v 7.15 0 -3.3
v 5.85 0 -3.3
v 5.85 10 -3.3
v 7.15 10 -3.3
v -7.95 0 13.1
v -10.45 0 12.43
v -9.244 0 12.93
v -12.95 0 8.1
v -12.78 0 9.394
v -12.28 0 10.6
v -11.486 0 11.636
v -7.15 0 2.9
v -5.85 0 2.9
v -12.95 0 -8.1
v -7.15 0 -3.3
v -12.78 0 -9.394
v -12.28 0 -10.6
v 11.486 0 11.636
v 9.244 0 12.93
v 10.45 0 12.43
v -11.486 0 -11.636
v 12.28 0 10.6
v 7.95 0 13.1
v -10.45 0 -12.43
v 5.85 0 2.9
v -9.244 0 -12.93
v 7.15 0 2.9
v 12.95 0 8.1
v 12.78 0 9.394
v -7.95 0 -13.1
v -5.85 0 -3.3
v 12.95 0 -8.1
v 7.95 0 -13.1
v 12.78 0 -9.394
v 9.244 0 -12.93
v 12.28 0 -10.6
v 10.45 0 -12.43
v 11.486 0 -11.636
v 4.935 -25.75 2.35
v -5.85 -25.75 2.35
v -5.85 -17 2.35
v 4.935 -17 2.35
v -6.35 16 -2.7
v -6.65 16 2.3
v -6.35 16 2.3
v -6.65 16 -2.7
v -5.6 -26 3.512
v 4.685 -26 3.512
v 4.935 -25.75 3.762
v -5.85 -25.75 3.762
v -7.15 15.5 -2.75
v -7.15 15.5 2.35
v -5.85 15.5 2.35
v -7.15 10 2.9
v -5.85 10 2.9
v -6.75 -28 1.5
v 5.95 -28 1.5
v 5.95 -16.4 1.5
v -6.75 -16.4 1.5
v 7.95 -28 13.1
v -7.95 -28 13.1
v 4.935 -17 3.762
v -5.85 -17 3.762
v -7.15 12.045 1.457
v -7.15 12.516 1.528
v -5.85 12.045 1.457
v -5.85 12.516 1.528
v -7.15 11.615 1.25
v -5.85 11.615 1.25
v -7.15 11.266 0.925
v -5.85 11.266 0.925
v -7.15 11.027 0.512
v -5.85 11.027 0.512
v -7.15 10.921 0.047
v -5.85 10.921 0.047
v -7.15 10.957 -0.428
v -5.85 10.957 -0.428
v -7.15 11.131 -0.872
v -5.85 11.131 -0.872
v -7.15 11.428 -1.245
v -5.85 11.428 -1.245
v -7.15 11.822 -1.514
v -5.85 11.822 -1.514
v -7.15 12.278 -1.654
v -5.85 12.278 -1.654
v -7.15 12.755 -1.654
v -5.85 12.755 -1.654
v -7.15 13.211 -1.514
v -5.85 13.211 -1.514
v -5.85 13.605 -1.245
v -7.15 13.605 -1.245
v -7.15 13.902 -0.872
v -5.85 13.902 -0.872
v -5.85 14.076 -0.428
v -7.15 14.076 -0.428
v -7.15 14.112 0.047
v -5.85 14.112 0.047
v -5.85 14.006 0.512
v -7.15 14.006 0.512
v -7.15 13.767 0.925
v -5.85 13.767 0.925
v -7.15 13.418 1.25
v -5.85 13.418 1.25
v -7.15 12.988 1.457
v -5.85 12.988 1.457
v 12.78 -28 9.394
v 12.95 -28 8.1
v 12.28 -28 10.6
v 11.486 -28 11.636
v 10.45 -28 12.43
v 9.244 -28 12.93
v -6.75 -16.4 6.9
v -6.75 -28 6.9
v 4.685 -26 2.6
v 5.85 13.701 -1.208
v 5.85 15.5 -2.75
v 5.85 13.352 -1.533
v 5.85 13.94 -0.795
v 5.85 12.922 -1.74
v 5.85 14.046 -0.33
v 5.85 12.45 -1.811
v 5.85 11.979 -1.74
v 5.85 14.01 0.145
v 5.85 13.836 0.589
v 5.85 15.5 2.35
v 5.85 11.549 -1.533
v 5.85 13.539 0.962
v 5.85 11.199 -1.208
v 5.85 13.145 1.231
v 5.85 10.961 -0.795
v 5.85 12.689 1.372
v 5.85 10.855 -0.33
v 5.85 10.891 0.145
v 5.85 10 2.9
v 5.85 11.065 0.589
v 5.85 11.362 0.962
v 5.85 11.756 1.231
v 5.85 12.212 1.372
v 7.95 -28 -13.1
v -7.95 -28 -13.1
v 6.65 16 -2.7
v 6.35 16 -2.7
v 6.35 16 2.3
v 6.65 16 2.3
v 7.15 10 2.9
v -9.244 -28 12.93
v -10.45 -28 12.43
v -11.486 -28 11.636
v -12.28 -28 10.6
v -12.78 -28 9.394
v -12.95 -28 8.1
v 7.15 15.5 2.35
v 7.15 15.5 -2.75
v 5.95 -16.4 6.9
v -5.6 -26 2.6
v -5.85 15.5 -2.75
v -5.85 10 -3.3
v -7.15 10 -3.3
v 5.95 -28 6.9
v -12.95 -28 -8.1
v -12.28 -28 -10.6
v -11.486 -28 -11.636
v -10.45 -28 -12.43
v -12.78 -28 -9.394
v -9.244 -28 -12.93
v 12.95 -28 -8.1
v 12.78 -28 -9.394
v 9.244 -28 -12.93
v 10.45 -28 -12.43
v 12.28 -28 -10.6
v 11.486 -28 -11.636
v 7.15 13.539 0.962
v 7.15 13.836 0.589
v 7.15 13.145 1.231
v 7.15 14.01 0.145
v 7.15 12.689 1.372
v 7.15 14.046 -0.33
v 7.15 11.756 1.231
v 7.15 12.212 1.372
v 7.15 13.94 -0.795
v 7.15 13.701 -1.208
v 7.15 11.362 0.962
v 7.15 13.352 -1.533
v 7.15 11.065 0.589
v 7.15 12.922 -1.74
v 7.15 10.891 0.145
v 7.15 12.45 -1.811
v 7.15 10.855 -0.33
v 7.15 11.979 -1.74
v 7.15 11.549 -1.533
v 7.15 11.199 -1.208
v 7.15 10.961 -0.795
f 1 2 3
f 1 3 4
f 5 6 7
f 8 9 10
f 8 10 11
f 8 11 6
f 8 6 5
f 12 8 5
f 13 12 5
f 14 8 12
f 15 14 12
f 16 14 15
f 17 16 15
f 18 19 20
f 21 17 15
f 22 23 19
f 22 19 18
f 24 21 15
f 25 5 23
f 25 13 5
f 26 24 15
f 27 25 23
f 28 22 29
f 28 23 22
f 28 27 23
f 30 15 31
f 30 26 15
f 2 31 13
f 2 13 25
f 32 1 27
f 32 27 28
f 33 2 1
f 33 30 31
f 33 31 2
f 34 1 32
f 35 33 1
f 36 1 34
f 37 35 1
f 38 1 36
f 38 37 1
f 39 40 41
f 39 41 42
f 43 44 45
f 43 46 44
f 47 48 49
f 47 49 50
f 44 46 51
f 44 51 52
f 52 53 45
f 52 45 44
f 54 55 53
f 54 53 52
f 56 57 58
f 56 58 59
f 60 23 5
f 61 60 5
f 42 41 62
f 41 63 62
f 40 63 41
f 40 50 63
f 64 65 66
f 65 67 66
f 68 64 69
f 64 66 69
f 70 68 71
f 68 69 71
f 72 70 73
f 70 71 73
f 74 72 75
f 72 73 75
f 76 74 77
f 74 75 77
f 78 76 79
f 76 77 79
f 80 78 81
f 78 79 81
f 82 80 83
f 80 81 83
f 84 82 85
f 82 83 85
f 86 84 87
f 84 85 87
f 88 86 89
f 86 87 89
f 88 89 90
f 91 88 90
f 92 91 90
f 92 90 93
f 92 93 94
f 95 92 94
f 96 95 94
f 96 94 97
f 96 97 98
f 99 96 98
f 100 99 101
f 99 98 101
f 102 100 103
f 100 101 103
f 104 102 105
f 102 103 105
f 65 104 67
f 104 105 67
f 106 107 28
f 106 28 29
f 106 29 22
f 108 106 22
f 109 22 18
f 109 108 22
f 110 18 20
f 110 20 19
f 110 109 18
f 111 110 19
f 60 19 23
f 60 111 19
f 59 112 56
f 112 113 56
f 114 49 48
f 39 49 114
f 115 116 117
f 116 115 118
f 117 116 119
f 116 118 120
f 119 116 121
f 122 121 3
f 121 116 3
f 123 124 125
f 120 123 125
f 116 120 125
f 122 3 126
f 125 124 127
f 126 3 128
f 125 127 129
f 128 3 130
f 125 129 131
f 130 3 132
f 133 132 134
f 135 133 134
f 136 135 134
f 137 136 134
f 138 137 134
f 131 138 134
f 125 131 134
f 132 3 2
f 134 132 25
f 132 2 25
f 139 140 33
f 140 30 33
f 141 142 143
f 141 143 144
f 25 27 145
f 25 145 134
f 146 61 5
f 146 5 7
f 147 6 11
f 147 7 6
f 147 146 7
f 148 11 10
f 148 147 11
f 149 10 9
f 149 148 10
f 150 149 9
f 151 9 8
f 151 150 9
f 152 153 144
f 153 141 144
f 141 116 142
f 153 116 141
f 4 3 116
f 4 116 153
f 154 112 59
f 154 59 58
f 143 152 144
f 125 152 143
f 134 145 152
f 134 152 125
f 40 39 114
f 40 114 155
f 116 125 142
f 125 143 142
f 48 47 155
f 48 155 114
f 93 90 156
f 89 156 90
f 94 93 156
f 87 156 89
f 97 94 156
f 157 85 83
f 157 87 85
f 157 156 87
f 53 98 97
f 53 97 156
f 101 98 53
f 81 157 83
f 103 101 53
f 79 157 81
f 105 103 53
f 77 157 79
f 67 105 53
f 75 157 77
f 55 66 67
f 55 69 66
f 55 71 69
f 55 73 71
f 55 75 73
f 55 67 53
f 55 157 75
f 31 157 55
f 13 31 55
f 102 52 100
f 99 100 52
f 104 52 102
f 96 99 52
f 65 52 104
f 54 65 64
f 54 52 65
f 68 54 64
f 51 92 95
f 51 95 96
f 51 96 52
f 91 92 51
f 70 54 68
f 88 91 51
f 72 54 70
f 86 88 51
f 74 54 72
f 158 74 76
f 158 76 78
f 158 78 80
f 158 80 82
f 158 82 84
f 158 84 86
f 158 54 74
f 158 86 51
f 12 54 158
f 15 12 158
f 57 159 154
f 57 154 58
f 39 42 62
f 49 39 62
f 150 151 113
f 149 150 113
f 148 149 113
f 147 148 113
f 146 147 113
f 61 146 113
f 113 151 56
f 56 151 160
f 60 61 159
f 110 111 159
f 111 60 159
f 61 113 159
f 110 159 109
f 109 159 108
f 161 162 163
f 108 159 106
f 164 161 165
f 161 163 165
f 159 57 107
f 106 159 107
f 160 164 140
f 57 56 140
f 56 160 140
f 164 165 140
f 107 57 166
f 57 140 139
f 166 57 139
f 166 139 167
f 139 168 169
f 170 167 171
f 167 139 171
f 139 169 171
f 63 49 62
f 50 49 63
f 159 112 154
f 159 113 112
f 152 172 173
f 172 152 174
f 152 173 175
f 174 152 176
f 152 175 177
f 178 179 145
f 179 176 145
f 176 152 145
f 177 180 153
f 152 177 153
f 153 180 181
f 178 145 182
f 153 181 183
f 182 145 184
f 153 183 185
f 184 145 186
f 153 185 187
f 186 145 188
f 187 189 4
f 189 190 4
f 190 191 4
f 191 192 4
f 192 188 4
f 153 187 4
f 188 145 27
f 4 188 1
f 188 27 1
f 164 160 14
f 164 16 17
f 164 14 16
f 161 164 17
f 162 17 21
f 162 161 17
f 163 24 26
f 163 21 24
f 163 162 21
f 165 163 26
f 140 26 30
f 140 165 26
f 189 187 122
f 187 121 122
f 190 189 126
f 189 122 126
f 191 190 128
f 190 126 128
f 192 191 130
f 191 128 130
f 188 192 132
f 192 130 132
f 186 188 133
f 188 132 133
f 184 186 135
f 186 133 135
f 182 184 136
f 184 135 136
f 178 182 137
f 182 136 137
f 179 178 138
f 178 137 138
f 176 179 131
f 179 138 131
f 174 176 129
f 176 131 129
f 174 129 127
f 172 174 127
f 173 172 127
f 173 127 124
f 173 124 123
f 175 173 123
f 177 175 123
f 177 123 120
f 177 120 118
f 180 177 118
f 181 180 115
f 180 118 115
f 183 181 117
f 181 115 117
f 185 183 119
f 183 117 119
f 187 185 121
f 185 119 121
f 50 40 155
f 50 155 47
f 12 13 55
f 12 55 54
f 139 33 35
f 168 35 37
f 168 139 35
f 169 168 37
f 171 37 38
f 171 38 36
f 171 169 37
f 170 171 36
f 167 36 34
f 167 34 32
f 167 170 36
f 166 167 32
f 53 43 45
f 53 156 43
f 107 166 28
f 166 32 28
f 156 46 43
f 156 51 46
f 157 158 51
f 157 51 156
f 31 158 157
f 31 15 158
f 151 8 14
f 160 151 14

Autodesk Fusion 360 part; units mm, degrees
sketch "スケッチ1" plane through (0, 0, 0) normal (0, 1, 0) x (1, 0, 0)
  line L0 (-12.95, 13.1) -> (12.95, 13.1)
  line L1 (12.95, 13.1) -> (12.95, -13.1)
  line L2 (12.95, -13.1) -> (-12.95, -13.1)
  line L3 (-12.95, -13.1) -> (-12.95, 13.1)
  line L4 (5.85, 3.3) -> (5.85, -2.9)
  line L5 (5.85, -2.9) -> (5.85, 3.3)
  line L6 (7.15, -2.9) -> (7.15, 3.3)
  line L7 (5.85, 3.3) -> (7.15, 3.3)
  line L8 (7.15, -2.9) -> (5.85, -2.9)
  line L9 (-7.15, 3.3) -> (-5.85, 3.3)
  line L10 (-5.85, 3.3) -> (-5.85, -2.9)
  line L11 (-5.85, -2.9) -> (-7.15, -2.9)
  line L12 (-7.15, -2.9) -> (-7.15, 3.3)
  line L13 (-12.95, 13.1) -> (12.95, -13.1) construction
  dimension "d1" = 26.2
  dimension "d3" = 1.3
  dimension "d4" = 1.3
  dimension "d5" = 6.2
  dimension "d6" = 6.2
  dimension "d9" = 25.9
  dimension "d10" = 5.8
  dimension "d11" = 5.8
  dimension "d12" = 9.8
  dimension "d13" = 9.8
extrude "押し出し1" add sketch "スケッチ1" against normal blind 28 contours L0 L1 L2 L3 | L4 L5 L6 L7 L8 | L9 L10 L11 L12 makes body 1
extrude "押し出し2" add sketch "スケッチ1" along normal blind 16 contours L4 L5 L6 L7 L8 | L9 L10 L11 L12 bodies 1
fillet "フィレット1" radius 5 4 edges at (12.95, -14, 13.1) (-12.95, -14, 13.1) (12.95, -14, -13.1) (-12.95, -14, -13.1) on bodies 1
chamfer "面取り1" distance 0.6 distance2 6 4 edges at (-6.5, 16, -3.3) (-6.5, 16, 2.9) (6.5, 16, 2.9) (6.5, 16, -3.3) measured on face at (-6.7167, 16, -1.2333) measured on face at (-6.7167, 16, -1.2333) measured on face at (6.2833, 16, -1.2333) measured on face at (6.2833, 16, -1.2333) on bodies 1
chamfer "面取り2" distance 0.5 angle 45 4 edges at (-7.15, 16, -0.2) (-5.85, 16, -0.2) (5.85, 16, -0.2) (7.15, 16, -0.2) on bodies 1
hole "穴1" at (7.15, 12.4504, -0.2106) direction (-1, 0, 0) diameter 3.2 depth 6 tip angle 118 bodies 1
hole "穴2" at (-7.15, 12.5165, -0.0723) direction (1, 0, 0) diameter 3.2 depth 6 tip angle 118 bodies 1
sketch "スケッチ2" plane through (0, -28, 0) normal (0, -1, 0) x (1, 0, 0)
  arc A0 (-12.95, -8.1) -> (-7.95, -13.1) centre (-7.95, -8.1) ccw
  line L0 (-7.95, -13.1) -> (7.95, -13.1)
  arc A1 (7.95, -13.1) -> (12.95, -8.1) centre (7.95, -8.1) ccw
  line L1 (12.95, -8.1) -> (12.95, 8.1)
  arc A2 (12.95, 8.1) -> (7.95, 13.1) centre (7.95, 8.1) ccw
  line L2 (7.95, 13.1) -> (-7.95, 13.1)
  arc A3 (-7.95, 13.1) -> (-12.95, 8.1) centre (-7.95, 8.1) ccw
  line L3 (-12.95, 8.1) -> (-12.95, -8.1)
  line L4 (-6.75, 6.9) -> (5.95, 6.9)
  line L5 (5.95, 6.9) -> (5.95, 1.5)
  line L6 (5.95, 1.5) -> (-6.75, 1.5)
  line L7 (-6.75, 6.9) -> (-6.75, 1.5)
  line L8 (-5.85, 3.7624) -> (-5.85, 2.35)
  line L9 (-5.85, 2.35) -> (4.9348, 2.35)
  line L10 (4.9348, 2.35) -> (4.9348, 3.7624)
  line L11 (4.9348, 3.7624) -> (-5.85, 3.7624)
  dimension "d28" = 12.7
  dimension "d29" = 5.4
  dimension "d30" = 6.2
  dimension "d31" = 6.2
extrude "押し出し4" cut sketch "スケッチ2" against normal blind 3 contours L8 L9 L10 L11 bodies 1
extrude "押し出し3" cut sketch "スケッチ2" against normal blind 11.6 contours L4 L5 L6 L7 | L8 L9 L10 L11 bodies 1
extrude "押し出し5" add sketch "スケッチ2" against normal blind 11 separate body contours L8 L9 L10 L11 makes body 2
move_face "面をオフセット1" offset -3 1 faces at (1.3399, -28, 3.2916) on bodies 2
extrude "押し出し6" add 1 faces at (1.3399, -25, 3.2916) along direction (0, -1, 0) blind 1 on bodies 2 bodies 2
chamfer "面取り3" distance 0.25 angle 45 1 edges at (-0.4576, -26, 3.7624) on bodies 2
chamfer "面取り4" distance 0.25 angle 45 1 edges at (-0.4576, -26, 2.35) on bodies 2
chamfer "面取り5" distance 0.25 angle 45 1 edges at (4.9348, -26, 3.0562) on bodies 2
chamfer "面取り6" distance 0.25 angle 45 1 edges at (-5.85, -26, 3.0562) on bodies 2
sketch "スケッチ3" plane through (0, 0, 0) normal (1, 0, 0) x (0, 0, -1)
  line L0 (53.2263, 26.7652) -> (6.6913, 26.7652)
  line L1 (12.0596, -308.4214) -> (9.4485, 270.6965)
  line L2 (12.6899, -265.3742) -> (9.9887, 251.0729)
